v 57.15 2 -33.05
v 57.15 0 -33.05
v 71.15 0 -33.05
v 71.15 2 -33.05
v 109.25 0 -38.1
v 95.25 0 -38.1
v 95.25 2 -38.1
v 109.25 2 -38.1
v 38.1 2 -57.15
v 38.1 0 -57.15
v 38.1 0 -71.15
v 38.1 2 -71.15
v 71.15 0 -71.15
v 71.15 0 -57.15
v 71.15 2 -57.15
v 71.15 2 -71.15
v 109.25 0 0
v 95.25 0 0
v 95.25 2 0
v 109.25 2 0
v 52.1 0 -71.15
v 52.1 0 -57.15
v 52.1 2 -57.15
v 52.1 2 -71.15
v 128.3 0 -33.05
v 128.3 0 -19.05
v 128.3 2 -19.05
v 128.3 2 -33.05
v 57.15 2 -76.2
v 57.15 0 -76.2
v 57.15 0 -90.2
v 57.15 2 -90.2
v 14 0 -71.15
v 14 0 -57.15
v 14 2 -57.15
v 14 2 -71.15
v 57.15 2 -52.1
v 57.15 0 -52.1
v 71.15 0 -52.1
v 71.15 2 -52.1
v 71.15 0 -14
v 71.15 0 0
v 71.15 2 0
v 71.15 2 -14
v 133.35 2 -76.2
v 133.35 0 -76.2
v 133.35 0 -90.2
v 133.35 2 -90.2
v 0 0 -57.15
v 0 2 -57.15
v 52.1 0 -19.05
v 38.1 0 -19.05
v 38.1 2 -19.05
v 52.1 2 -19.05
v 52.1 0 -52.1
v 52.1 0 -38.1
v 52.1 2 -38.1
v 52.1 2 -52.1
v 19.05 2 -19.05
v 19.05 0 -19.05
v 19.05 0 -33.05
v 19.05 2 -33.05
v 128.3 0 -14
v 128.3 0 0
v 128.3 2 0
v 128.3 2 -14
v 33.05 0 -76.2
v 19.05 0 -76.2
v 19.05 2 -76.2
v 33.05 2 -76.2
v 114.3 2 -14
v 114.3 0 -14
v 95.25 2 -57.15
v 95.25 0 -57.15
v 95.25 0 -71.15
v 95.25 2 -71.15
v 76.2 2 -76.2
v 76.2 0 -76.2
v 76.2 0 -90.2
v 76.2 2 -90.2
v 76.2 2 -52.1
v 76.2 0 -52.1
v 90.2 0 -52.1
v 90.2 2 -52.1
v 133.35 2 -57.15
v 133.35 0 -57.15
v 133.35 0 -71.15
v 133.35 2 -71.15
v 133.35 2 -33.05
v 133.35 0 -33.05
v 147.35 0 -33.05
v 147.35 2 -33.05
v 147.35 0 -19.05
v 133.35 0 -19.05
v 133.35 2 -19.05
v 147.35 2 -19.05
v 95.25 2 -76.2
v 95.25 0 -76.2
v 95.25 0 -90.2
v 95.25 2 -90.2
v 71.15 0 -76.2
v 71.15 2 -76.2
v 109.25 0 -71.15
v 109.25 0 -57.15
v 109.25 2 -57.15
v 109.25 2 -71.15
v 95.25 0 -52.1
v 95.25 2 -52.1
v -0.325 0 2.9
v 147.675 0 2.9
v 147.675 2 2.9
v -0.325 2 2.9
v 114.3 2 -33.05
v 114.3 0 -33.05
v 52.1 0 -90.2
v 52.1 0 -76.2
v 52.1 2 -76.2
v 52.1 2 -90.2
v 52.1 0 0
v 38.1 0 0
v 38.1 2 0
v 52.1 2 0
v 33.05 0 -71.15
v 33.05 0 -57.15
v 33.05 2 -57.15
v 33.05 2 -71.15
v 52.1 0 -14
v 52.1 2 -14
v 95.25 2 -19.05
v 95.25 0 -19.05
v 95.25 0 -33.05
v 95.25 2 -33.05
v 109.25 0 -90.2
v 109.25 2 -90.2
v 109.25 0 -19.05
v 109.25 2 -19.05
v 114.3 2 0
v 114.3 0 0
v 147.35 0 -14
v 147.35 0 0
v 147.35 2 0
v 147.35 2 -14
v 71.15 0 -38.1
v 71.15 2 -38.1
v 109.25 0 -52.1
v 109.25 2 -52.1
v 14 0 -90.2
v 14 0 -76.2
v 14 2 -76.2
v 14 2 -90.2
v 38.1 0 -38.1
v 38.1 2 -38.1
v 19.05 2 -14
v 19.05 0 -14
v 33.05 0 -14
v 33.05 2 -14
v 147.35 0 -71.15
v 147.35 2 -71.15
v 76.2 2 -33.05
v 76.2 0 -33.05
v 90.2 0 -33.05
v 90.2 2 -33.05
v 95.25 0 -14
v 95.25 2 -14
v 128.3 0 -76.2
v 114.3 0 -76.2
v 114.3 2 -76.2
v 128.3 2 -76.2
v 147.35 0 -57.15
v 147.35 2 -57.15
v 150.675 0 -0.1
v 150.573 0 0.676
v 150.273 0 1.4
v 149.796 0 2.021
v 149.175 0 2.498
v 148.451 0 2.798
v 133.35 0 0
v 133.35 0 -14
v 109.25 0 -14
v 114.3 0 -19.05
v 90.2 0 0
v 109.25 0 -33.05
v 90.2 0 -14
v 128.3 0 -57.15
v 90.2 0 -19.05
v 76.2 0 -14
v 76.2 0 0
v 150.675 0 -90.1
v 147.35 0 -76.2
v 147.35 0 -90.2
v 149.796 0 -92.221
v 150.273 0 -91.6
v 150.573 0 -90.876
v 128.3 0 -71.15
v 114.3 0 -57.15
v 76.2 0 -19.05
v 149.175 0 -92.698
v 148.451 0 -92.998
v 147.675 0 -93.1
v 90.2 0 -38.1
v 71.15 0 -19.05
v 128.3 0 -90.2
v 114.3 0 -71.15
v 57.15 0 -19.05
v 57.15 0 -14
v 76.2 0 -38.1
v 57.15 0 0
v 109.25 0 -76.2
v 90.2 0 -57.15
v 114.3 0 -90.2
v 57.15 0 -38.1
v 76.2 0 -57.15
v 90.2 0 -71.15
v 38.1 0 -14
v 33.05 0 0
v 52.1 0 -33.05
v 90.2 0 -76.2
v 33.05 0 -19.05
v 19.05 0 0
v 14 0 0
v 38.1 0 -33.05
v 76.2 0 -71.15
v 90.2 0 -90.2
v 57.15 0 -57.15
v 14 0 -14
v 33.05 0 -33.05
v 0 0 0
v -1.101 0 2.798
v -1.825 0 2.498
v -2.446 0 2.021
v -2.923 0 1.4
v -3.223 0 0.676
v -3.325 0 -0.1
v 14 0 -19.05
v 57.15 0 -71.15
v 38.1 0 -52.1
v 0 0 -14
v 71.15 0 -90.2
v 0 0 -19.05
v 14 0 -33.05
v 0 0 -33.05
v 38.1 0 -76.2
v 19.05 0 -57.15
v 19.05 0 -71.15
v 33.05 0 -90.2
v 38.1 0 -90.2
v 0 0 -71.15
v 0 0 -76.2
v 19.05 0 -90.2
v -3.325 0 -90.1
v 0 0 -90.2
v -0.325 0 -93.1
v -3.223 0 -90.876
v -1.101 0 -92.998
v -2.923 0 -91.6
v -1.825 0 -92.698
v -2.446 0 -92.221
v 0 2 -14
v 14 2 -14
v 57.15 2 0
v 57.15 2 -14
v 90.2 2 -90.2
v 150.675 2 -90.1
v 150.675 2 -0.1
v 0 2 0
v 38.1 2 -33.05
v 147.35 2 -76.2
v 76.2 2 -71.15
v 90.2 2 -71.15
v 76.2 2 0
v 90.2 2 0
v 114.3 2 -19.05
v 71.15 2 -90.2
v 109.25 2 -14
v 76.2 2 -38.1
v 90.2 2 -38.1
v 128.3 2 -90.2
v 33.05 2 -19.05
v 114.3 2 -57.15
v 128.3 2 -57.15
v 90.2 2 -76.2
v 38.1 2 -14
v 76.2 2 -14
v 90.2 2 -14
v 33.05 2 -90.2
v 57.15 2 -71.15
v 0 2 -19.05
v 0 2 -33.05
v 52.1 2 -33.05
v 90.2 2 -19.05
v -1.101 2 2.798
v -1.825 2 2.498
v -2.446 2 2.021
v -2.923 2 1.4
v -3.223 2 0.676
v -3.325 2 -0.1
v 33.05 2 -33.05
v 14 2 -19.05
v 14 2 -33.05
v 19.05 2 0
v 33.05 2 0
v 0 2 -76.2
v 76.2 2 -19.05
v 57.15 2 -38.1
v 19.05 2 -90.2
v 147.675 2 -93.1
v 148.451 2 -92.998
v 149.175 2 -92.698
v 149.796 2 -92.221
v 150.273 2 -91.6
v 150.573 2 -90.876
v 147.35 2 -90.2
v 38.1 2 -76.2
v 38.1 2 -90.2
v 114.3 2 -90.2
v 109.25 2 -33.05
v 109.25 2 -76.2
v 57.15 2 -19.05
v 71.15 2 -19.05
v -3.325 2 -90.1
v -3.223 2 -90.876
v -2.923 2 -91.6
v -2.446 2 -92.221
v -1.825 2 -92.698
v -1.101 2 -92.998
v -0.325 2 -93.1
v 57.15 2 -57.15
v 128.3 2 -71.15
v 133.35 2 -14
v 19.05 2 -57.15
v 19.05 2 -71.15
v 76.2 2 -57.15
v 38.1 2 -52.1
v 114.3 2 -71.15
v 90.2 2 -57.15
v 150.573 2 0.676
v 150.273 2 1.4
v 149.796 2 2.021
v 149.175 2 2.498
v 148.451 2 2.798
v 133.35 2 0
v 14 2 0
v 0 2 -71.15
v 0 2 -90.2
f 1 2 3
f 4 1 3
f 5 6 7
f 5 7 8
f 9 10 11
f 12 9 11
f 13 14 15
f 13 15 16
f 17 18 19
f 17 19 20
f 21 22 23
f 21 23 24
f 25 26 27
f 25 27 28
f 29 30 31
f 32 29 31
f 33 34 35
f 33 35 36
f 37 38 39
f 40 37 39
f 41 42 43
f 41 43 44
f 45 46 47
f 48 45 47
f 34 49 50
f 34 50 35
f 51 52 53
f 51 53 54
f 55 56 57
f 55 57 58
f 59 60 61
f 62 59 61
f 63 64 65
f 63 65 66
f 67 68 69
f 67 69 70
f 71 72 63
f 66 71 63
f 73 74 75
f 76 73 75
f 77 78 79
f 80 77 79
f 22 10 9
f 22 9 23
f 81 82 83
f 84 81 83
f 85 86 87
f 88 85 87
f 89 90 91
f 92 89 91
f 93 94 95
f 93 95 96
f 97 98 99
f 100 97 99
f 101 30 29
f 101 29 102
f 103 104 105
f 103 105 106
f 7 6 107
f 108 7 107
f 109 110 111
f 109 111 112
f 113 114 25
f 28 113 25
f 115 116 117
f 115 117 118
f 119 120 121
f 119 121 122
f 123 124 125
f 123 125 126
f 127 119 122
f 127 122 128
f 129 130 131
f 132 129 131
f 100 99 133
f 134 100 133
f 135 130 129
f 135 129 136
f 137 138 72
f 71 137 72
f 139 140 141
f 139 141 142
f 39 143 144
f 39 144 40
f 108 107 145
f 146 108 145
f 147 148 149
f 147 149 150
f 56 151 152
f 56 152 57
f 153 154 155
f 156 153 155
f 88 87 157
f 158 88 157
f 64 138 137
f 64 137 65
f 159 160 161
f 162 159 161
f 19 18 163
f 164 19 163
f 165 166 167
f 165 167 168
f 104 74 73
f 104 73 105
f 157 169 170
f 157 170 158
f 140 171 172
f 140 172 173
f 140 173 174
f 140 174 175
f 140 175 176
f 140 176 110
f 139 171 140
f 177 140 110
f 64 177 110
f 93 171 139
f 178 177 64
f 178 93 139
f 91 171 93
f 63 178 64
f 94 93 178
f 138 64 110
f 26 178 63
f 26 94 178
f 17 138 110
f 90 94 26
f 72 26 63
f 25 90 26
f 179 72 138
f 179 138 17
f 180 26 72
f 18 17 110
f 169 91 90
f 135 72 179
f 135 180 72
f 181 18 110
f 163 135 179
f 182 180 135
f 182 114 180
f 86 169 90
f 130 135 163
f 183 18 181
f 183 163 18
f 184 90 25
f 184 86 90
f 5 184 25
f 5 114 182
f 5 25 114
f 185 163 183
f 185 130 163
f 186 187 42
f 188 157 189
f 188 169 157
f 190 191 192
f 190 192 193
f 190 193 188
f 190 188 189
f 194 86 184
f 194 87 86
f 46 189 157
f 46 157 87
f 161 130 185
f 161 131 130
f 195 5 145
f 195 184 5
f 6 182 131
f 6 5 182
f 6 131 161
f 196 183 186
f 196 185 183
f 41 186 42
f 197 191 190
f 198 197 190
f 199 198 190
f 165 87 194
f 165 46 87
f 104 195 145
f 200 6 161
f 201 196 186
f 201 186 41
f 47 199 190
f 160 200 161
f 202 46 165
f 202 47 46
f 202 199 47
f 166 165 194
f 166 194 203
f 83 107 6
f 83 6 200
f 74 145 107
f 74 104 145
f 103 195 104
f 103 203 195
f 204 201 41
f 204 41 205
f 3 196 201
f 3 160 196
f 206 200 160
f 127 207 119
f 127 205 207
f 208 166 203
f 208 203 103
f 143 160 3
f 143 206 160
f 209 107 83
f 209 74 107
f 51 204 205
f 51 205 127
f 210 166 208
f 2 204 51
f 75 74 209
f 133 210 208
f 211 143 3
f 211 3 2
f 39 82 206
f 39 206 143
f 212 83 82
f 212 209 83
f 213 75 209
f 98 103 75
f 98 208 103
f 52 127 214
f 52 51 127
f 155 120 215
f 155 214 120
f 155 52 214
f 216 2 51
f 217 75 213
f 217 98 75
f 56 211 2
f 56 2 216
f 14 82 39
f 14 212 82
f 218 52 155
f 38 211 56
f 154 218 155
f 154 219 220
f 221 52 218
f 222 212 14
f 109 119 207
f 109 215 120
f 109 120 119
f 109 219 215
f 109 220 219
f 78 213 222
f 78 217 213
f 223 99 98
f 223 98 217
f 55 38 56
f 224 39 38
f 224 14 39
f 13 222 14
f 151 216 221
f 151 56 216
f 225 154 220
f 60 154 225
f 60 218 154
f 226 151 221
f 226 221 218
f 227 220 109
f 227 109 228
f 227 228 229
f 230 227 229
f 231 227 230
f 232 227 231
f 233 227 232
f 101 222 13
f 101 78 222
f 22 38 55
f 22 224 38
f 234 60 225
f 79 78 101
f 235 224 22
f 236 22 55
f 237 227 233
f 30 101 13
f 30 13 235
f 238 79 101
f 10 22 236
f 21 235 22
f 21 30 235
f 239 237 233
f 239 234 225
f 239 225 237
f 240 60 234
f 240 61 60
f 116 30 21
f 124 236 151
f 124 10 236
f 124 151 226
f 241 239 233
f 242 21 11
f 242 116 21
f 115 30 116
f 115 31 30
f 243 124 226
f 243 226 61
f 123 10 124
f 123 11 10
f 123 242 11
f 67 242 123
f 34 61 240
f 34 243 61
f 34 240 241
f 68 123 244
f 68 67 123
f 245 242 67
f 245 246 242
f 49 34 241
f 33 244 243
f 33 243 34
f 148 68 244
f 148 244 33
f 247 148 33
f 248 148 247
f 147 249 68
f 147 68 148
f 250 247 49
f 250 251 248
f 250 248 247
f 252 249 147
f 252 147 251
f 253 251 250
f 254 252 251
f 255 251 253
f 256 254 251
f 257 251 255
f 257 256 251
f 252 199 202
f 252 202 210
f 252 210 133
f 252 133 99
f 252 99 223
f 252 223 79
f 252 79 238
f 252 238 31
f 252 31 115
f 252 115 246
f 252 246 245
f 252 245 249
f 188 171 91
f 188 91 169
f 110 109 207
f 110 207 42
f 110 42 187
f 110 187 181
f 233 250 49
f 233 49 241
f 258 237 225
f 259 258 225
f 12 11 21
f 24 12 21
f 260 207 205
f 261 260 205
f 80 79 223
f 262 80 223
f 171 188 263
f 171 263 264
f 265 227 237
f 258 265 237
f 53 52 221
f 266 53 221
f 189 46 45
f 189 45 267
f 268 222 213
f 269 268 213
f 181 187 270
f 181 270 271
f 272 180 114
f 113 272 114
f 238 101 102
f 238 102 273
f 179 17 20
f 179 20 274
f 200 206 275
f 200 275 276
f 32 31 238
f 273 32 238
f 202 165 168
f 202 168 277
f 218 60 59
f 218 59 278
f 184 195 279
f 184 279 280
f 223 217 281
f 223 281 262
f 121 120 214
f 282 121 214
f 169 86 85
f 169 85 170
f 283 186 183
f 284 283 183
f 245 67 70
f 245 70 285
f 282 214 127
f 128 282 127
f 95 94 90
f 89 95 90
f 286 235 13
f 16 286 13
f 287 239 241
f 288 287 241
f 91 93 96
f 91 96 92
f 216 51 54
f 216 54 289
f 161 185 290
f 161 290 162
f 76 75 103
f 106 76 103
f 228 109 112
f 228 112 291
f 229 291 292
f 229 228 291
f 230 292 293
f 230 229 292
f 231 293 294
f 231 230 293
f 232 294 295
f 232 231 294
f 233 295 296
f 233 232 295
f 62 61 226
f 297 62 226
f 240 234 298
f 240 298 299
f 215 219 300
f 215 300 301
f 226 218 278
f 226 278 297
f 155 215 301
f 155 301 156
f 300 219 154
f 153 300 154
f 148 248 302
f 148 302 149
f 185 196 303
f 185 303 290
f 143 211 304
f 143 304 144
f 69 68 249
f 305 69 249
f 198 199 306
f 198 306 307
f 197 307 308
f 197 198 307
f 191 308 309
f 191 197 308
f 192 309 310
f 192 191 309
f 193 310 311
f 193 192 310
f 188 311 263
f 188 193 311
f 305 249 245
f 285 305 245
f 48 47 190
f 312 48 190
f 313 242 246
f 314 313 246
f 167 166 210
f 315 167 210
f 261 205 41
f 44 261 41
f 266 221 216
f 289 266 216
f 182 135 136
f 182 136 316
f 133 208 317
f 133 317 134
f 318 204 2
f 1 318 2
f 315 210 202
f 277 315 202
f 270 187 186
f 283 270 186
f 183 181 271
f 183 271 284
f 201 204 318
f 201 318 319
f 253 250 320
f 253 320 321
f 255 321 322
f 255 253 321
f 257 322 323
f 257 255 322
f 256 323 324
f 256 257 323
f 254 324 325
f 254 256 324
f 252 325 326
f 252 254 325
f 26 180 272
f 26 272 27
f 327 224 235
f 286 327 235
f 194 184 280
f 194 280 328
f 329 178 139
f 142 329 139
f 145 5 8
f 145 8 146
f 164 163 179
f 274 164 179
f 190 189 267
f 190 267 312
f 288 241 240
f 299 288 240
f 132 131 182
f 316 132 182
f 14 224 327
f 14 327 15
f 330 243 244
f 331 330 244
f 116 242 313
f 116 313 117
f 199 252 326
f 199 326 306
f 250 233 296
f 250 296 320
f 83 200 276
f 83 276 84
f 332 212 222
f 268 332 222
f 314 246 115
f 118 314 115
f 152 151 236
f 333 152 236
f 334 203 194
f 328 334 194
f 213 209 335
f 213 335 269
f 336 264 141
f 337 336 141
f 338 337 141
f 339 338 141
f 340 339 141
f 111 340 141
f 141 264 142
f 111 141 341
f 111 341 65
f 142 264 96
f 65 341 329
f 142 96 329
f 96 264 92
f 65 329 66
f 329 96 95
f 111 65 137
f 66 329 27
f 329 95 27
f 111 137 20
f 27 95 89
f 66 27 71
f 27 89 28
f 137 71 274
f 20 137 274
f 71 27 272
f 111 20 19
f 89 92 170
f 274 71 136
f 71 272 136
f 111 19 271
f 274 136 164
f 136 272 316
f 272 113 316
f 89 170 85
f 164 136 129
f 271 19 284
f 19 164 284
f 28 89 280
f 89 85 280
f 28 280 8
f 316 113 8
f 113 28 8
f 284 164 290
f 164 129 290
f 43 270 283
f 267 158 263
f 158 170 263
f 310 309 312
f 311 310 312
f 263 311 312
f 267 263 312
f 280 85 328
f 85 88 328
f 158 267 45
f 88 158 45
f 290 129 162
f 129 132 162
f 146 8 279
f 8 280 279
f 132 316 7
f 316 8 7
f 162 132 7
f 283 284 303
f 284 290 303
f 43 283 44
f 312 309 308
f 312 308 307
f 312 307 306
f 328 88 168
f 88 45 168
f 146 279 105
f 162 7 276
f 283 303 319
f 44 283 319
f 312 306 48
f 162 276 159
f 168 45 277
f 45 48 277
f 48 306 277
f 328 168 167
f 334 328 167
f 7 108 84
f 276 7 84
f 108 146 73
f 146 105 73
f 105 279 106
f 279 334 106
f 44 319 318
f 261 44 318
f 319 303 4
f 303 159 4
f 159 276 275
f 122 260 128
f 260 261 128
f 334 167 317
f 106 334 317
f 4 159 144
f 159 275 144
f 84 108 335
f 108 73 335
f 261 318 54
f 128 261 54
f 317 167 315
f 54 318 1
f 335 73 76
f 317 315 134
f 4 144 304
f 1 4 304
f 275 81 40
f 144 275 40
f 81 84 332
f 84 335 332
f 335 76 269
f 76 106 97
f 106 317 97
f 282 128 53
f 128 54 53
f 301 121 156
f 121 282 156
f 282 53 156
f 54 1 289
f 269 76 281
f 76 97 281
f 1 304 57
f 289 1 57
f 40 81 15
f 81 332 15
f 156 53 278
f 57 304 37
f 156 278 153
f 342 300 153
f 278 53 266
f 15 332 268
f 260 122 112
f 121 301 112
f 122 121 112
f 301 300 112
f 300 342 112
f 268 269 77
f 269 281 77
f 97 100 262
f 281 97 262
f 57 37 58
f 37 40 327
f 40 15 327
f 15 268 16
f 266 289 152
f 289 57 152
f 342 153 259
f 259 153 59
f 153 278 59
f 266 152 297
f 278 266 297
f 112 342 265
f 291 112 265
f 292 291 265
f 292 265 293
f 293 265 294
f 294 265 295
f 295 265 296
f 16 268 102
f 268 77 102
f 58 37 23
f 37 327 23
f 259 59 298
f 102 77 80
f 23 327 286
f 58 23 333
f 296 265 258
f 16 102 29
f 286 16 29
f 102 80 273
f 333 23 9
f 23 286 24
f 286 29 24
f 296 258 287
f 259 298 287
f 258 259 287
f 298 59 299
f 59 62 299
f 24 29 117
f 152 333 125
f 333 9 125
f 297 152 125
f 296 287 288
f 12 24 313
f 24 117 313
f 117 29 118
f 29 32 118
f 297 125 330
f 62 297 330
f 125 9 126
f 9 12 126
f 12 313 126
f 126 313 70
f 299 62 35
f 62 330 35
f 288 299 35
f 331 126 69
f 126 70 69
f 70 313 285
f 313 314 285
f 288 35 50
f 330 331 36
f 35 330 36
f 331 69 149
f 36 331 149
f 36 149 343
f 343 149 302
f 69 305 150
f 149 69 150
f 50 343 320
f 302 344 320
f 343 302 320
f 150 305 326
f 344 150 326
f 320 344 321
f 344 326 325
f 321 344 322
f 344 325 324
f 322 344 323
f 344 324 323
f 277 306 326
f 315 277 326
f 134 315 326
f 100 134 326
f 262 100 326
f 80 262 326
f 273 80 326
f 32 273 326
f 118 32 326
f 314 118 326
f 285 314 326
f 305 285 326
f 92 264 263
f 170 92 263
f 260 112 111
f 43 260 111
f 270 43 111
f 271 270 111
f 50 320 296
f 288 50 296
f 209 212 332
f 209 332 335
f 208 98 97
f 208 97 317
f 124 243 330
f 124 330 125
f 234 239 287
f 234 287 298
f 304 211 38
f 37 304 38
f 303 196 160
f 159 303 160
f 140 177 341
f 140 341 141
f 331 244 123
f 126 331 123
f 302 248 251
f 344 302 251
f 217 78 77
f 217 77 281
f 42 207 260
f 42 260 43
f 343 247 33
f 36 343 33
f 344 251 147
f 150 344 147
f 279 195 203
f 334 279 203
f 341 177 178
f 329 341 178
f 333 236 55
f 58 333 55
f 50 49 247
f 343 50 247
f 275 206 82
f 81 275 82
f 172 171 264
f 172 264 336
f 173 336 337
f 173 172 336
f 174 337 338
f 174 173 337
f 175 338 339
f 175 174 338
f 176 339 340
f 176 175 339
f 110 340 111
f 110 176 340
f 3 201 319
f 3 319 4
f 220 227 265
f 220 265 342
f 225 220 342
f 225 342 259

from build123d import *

# Parameters (mm, degrees)
BOSS_EXTRUDE1_DEPTH     = 2
CUT_EXTRUDE3_DEPTH      = 178.128669687
CUT_EXTRUDE3_DEPTH_BACK = 178.128669687
SKETCH14_W              = 14
SKETCH14_H              = 14


with BuildPart() as part:
    # Sketch16 → Boss-Extrude1 (new body)
    with BuildSketch(Plane(origin=(0, 0, 0), x_dir=(1, 0, 0), z_dir=(0, 1, 0))):
        with BuildLine():
            Line((-0.325, 93.1), (147.675, 93.1))
            ThreePointArc((147.675, 93.1), (149.796320344, 92.221320344), (150.675, 90.1))
            Line((150.675, 90.1), (150.675, 0.1))
            ThreePointArc((150.675, 0.1), (149.796320344, -2.021320344), (147.675, -2.9))
            Line((147.675, -2.9), (-0.325, -2.9))
            ThreePointArc((-0.325, -2.9), (-2.446320344, -2.021320344), (-3.325, 0.1))
            Line((-3.325, 0.1), (-3.325, 90.1))
            ThreePointArc((-3.325, 90.1), (-2.446320344, 92.221320344), (-0.325, 93.1))
        make_face()
    extrude(amount=BOSS_EXTRUDE1_DEPTH)

    # Sketch14 → Cut-Extrude3 (cut, two sides: drawn at the far end of the back side and taken through both)
    with BuildSketch(Plane(origin=(0, 0, 0), x_dir=(1, 0, 0), z_dir=(0, 1, 0)).offset(-CUT_EXTRUDE3_DEPTH_BACK)):
        with Locations((26.05, 7)):
            Rectangle(SKETCH14_W, SKETCH14_H)
        with Locations((7, 7)):
            Rectangle(SKETCH14_W, SKETCH14_H)
        with Locations((45.1, 7)):
            Rectangle(SKETCH14_W, SKETCH14_H)
        with Locations((64.15, 7)):
            Rectangle(SKETCH14_W, SKETCH14_H)
        with Locations((83.2, 7)):
            Rectangle(SKETCH14_W, SKETCH14_H)
        with Locations((102.25, 7)):
            Rectangle(SKETCH14_W, SKETCH14_H)
        with Locations((121.3, 7)):
            Rectangle(SKETCH14_W, SKETCH14_H)
        with Locations((140.35, 7)):
            Rectangle(SKETCH14_W, SKETCH14_H)
        with Locations((26.05, 26.05)):
            Rectangle(SKETCH14_W, SKETCH14_H)
        with Locations((45.1, 26.05)):
            Rectangle(SKETCH14_W, SKETCH14_H)
        with Locations((64.15, 26.05)):
            Rectangle(SKETCH14_W, SKETCH14_H)
        with Locations((83.2, 26.05)):
            Rectangle(SKETCH14_W, SKETCH14_H)
        with Locations((102.25, 26.05)):
            Rectangle(SKETCH14_W, SKETCH14_H)
        with Locations((121.3, 26.05)):
            Rectangle(SKETCH14_W, SKETCH14_H)
        with Locations((140.35, 26.05)):
            Rectangle(SKETCH14_W, SKETCH14_H)
        with Locations((45.1, 45.1)):
            Rectangle(SKETCH14_W, SKETCH14_H)
        with Locations((64.15, 45.1)):
            Rectangle(SKETCH14_W, SKETCH14_H)
        with Locations((83.2, 45.1)):
            Rectangle(SKETCH14_W, SKETCH14_H)
        with Locations((102.25, 45.1)):
            Rectangle(SKETCH14_W, SKETCH14_H)
        with Locations((26.05, 64.15)):
            Rectangle(SKETCH14_W, SKETCH14_H)
        with Locations((45.1, 64.15)):
            Rectangle(SKETCH14_W, SKETCH14_H)
        with Locations((64.15, 64.15)):
            Rectangle(SKETCH14_W, SKETCH14_H)
        with Locations((83.2, 64.15)):
            Rectangle(SKETCH14_W, SKETCH14_H)
        with Locations((102.25, 64.15)):
            Rectangle(SKETCH14_W, SKETCH14_H)
        with Locations((121.3, 64.15)):
            Rectangle(SKETCH14_W, SKETCH14_H)
        with Locations((140.35, 64.15)):
            Rectangle(SKETCH14_W, SKETCH14_H)
        with Locations((26.05, 83.2)):
            Rectangle(SKETCH14_W, SKETCH14_H)
        with Locations((45.1, 83.2)):
            Rectangle(SKETCH14_W, SKETCH14_H)
        with Locations((64.15, 83.2)):
            Rectangle(SKETCH14_W, SKETCH14_H)
        with Locations((83.2, 83.2)):
            Rectangle(SKETCH14_W, SKETCH14_H)
        with Locations((102.25, 83.2)):
            Rectangle(SKETCH14_W, SKETCH14_H)
        with Locations((121.3, 83.2)):
            Rectangle(SKETCH14_W, SKETCH14_H)
        with Locations((140.35, 83.2)):
            Rectangle(SKETCH14_W, SKETCH14_H)
        with Locations((7, 26.05)):
            Rectangle(SKETCH14_W, SKETCH14_H)
        with Locations((7, 64.15)):
            Rectangle(SKETCH14_W, SKETCH14_H)
        with Locations((7, 83.2)):
            Rectangle(SKETCH14_W, SKETCH14_H)
    extrude(amount=CUT_EXTRUDE3_DEPTH + CUT_EXTRUDE3_DEPTH_BACK, mode=Mode.SUBTRACT)


solid = part.part
